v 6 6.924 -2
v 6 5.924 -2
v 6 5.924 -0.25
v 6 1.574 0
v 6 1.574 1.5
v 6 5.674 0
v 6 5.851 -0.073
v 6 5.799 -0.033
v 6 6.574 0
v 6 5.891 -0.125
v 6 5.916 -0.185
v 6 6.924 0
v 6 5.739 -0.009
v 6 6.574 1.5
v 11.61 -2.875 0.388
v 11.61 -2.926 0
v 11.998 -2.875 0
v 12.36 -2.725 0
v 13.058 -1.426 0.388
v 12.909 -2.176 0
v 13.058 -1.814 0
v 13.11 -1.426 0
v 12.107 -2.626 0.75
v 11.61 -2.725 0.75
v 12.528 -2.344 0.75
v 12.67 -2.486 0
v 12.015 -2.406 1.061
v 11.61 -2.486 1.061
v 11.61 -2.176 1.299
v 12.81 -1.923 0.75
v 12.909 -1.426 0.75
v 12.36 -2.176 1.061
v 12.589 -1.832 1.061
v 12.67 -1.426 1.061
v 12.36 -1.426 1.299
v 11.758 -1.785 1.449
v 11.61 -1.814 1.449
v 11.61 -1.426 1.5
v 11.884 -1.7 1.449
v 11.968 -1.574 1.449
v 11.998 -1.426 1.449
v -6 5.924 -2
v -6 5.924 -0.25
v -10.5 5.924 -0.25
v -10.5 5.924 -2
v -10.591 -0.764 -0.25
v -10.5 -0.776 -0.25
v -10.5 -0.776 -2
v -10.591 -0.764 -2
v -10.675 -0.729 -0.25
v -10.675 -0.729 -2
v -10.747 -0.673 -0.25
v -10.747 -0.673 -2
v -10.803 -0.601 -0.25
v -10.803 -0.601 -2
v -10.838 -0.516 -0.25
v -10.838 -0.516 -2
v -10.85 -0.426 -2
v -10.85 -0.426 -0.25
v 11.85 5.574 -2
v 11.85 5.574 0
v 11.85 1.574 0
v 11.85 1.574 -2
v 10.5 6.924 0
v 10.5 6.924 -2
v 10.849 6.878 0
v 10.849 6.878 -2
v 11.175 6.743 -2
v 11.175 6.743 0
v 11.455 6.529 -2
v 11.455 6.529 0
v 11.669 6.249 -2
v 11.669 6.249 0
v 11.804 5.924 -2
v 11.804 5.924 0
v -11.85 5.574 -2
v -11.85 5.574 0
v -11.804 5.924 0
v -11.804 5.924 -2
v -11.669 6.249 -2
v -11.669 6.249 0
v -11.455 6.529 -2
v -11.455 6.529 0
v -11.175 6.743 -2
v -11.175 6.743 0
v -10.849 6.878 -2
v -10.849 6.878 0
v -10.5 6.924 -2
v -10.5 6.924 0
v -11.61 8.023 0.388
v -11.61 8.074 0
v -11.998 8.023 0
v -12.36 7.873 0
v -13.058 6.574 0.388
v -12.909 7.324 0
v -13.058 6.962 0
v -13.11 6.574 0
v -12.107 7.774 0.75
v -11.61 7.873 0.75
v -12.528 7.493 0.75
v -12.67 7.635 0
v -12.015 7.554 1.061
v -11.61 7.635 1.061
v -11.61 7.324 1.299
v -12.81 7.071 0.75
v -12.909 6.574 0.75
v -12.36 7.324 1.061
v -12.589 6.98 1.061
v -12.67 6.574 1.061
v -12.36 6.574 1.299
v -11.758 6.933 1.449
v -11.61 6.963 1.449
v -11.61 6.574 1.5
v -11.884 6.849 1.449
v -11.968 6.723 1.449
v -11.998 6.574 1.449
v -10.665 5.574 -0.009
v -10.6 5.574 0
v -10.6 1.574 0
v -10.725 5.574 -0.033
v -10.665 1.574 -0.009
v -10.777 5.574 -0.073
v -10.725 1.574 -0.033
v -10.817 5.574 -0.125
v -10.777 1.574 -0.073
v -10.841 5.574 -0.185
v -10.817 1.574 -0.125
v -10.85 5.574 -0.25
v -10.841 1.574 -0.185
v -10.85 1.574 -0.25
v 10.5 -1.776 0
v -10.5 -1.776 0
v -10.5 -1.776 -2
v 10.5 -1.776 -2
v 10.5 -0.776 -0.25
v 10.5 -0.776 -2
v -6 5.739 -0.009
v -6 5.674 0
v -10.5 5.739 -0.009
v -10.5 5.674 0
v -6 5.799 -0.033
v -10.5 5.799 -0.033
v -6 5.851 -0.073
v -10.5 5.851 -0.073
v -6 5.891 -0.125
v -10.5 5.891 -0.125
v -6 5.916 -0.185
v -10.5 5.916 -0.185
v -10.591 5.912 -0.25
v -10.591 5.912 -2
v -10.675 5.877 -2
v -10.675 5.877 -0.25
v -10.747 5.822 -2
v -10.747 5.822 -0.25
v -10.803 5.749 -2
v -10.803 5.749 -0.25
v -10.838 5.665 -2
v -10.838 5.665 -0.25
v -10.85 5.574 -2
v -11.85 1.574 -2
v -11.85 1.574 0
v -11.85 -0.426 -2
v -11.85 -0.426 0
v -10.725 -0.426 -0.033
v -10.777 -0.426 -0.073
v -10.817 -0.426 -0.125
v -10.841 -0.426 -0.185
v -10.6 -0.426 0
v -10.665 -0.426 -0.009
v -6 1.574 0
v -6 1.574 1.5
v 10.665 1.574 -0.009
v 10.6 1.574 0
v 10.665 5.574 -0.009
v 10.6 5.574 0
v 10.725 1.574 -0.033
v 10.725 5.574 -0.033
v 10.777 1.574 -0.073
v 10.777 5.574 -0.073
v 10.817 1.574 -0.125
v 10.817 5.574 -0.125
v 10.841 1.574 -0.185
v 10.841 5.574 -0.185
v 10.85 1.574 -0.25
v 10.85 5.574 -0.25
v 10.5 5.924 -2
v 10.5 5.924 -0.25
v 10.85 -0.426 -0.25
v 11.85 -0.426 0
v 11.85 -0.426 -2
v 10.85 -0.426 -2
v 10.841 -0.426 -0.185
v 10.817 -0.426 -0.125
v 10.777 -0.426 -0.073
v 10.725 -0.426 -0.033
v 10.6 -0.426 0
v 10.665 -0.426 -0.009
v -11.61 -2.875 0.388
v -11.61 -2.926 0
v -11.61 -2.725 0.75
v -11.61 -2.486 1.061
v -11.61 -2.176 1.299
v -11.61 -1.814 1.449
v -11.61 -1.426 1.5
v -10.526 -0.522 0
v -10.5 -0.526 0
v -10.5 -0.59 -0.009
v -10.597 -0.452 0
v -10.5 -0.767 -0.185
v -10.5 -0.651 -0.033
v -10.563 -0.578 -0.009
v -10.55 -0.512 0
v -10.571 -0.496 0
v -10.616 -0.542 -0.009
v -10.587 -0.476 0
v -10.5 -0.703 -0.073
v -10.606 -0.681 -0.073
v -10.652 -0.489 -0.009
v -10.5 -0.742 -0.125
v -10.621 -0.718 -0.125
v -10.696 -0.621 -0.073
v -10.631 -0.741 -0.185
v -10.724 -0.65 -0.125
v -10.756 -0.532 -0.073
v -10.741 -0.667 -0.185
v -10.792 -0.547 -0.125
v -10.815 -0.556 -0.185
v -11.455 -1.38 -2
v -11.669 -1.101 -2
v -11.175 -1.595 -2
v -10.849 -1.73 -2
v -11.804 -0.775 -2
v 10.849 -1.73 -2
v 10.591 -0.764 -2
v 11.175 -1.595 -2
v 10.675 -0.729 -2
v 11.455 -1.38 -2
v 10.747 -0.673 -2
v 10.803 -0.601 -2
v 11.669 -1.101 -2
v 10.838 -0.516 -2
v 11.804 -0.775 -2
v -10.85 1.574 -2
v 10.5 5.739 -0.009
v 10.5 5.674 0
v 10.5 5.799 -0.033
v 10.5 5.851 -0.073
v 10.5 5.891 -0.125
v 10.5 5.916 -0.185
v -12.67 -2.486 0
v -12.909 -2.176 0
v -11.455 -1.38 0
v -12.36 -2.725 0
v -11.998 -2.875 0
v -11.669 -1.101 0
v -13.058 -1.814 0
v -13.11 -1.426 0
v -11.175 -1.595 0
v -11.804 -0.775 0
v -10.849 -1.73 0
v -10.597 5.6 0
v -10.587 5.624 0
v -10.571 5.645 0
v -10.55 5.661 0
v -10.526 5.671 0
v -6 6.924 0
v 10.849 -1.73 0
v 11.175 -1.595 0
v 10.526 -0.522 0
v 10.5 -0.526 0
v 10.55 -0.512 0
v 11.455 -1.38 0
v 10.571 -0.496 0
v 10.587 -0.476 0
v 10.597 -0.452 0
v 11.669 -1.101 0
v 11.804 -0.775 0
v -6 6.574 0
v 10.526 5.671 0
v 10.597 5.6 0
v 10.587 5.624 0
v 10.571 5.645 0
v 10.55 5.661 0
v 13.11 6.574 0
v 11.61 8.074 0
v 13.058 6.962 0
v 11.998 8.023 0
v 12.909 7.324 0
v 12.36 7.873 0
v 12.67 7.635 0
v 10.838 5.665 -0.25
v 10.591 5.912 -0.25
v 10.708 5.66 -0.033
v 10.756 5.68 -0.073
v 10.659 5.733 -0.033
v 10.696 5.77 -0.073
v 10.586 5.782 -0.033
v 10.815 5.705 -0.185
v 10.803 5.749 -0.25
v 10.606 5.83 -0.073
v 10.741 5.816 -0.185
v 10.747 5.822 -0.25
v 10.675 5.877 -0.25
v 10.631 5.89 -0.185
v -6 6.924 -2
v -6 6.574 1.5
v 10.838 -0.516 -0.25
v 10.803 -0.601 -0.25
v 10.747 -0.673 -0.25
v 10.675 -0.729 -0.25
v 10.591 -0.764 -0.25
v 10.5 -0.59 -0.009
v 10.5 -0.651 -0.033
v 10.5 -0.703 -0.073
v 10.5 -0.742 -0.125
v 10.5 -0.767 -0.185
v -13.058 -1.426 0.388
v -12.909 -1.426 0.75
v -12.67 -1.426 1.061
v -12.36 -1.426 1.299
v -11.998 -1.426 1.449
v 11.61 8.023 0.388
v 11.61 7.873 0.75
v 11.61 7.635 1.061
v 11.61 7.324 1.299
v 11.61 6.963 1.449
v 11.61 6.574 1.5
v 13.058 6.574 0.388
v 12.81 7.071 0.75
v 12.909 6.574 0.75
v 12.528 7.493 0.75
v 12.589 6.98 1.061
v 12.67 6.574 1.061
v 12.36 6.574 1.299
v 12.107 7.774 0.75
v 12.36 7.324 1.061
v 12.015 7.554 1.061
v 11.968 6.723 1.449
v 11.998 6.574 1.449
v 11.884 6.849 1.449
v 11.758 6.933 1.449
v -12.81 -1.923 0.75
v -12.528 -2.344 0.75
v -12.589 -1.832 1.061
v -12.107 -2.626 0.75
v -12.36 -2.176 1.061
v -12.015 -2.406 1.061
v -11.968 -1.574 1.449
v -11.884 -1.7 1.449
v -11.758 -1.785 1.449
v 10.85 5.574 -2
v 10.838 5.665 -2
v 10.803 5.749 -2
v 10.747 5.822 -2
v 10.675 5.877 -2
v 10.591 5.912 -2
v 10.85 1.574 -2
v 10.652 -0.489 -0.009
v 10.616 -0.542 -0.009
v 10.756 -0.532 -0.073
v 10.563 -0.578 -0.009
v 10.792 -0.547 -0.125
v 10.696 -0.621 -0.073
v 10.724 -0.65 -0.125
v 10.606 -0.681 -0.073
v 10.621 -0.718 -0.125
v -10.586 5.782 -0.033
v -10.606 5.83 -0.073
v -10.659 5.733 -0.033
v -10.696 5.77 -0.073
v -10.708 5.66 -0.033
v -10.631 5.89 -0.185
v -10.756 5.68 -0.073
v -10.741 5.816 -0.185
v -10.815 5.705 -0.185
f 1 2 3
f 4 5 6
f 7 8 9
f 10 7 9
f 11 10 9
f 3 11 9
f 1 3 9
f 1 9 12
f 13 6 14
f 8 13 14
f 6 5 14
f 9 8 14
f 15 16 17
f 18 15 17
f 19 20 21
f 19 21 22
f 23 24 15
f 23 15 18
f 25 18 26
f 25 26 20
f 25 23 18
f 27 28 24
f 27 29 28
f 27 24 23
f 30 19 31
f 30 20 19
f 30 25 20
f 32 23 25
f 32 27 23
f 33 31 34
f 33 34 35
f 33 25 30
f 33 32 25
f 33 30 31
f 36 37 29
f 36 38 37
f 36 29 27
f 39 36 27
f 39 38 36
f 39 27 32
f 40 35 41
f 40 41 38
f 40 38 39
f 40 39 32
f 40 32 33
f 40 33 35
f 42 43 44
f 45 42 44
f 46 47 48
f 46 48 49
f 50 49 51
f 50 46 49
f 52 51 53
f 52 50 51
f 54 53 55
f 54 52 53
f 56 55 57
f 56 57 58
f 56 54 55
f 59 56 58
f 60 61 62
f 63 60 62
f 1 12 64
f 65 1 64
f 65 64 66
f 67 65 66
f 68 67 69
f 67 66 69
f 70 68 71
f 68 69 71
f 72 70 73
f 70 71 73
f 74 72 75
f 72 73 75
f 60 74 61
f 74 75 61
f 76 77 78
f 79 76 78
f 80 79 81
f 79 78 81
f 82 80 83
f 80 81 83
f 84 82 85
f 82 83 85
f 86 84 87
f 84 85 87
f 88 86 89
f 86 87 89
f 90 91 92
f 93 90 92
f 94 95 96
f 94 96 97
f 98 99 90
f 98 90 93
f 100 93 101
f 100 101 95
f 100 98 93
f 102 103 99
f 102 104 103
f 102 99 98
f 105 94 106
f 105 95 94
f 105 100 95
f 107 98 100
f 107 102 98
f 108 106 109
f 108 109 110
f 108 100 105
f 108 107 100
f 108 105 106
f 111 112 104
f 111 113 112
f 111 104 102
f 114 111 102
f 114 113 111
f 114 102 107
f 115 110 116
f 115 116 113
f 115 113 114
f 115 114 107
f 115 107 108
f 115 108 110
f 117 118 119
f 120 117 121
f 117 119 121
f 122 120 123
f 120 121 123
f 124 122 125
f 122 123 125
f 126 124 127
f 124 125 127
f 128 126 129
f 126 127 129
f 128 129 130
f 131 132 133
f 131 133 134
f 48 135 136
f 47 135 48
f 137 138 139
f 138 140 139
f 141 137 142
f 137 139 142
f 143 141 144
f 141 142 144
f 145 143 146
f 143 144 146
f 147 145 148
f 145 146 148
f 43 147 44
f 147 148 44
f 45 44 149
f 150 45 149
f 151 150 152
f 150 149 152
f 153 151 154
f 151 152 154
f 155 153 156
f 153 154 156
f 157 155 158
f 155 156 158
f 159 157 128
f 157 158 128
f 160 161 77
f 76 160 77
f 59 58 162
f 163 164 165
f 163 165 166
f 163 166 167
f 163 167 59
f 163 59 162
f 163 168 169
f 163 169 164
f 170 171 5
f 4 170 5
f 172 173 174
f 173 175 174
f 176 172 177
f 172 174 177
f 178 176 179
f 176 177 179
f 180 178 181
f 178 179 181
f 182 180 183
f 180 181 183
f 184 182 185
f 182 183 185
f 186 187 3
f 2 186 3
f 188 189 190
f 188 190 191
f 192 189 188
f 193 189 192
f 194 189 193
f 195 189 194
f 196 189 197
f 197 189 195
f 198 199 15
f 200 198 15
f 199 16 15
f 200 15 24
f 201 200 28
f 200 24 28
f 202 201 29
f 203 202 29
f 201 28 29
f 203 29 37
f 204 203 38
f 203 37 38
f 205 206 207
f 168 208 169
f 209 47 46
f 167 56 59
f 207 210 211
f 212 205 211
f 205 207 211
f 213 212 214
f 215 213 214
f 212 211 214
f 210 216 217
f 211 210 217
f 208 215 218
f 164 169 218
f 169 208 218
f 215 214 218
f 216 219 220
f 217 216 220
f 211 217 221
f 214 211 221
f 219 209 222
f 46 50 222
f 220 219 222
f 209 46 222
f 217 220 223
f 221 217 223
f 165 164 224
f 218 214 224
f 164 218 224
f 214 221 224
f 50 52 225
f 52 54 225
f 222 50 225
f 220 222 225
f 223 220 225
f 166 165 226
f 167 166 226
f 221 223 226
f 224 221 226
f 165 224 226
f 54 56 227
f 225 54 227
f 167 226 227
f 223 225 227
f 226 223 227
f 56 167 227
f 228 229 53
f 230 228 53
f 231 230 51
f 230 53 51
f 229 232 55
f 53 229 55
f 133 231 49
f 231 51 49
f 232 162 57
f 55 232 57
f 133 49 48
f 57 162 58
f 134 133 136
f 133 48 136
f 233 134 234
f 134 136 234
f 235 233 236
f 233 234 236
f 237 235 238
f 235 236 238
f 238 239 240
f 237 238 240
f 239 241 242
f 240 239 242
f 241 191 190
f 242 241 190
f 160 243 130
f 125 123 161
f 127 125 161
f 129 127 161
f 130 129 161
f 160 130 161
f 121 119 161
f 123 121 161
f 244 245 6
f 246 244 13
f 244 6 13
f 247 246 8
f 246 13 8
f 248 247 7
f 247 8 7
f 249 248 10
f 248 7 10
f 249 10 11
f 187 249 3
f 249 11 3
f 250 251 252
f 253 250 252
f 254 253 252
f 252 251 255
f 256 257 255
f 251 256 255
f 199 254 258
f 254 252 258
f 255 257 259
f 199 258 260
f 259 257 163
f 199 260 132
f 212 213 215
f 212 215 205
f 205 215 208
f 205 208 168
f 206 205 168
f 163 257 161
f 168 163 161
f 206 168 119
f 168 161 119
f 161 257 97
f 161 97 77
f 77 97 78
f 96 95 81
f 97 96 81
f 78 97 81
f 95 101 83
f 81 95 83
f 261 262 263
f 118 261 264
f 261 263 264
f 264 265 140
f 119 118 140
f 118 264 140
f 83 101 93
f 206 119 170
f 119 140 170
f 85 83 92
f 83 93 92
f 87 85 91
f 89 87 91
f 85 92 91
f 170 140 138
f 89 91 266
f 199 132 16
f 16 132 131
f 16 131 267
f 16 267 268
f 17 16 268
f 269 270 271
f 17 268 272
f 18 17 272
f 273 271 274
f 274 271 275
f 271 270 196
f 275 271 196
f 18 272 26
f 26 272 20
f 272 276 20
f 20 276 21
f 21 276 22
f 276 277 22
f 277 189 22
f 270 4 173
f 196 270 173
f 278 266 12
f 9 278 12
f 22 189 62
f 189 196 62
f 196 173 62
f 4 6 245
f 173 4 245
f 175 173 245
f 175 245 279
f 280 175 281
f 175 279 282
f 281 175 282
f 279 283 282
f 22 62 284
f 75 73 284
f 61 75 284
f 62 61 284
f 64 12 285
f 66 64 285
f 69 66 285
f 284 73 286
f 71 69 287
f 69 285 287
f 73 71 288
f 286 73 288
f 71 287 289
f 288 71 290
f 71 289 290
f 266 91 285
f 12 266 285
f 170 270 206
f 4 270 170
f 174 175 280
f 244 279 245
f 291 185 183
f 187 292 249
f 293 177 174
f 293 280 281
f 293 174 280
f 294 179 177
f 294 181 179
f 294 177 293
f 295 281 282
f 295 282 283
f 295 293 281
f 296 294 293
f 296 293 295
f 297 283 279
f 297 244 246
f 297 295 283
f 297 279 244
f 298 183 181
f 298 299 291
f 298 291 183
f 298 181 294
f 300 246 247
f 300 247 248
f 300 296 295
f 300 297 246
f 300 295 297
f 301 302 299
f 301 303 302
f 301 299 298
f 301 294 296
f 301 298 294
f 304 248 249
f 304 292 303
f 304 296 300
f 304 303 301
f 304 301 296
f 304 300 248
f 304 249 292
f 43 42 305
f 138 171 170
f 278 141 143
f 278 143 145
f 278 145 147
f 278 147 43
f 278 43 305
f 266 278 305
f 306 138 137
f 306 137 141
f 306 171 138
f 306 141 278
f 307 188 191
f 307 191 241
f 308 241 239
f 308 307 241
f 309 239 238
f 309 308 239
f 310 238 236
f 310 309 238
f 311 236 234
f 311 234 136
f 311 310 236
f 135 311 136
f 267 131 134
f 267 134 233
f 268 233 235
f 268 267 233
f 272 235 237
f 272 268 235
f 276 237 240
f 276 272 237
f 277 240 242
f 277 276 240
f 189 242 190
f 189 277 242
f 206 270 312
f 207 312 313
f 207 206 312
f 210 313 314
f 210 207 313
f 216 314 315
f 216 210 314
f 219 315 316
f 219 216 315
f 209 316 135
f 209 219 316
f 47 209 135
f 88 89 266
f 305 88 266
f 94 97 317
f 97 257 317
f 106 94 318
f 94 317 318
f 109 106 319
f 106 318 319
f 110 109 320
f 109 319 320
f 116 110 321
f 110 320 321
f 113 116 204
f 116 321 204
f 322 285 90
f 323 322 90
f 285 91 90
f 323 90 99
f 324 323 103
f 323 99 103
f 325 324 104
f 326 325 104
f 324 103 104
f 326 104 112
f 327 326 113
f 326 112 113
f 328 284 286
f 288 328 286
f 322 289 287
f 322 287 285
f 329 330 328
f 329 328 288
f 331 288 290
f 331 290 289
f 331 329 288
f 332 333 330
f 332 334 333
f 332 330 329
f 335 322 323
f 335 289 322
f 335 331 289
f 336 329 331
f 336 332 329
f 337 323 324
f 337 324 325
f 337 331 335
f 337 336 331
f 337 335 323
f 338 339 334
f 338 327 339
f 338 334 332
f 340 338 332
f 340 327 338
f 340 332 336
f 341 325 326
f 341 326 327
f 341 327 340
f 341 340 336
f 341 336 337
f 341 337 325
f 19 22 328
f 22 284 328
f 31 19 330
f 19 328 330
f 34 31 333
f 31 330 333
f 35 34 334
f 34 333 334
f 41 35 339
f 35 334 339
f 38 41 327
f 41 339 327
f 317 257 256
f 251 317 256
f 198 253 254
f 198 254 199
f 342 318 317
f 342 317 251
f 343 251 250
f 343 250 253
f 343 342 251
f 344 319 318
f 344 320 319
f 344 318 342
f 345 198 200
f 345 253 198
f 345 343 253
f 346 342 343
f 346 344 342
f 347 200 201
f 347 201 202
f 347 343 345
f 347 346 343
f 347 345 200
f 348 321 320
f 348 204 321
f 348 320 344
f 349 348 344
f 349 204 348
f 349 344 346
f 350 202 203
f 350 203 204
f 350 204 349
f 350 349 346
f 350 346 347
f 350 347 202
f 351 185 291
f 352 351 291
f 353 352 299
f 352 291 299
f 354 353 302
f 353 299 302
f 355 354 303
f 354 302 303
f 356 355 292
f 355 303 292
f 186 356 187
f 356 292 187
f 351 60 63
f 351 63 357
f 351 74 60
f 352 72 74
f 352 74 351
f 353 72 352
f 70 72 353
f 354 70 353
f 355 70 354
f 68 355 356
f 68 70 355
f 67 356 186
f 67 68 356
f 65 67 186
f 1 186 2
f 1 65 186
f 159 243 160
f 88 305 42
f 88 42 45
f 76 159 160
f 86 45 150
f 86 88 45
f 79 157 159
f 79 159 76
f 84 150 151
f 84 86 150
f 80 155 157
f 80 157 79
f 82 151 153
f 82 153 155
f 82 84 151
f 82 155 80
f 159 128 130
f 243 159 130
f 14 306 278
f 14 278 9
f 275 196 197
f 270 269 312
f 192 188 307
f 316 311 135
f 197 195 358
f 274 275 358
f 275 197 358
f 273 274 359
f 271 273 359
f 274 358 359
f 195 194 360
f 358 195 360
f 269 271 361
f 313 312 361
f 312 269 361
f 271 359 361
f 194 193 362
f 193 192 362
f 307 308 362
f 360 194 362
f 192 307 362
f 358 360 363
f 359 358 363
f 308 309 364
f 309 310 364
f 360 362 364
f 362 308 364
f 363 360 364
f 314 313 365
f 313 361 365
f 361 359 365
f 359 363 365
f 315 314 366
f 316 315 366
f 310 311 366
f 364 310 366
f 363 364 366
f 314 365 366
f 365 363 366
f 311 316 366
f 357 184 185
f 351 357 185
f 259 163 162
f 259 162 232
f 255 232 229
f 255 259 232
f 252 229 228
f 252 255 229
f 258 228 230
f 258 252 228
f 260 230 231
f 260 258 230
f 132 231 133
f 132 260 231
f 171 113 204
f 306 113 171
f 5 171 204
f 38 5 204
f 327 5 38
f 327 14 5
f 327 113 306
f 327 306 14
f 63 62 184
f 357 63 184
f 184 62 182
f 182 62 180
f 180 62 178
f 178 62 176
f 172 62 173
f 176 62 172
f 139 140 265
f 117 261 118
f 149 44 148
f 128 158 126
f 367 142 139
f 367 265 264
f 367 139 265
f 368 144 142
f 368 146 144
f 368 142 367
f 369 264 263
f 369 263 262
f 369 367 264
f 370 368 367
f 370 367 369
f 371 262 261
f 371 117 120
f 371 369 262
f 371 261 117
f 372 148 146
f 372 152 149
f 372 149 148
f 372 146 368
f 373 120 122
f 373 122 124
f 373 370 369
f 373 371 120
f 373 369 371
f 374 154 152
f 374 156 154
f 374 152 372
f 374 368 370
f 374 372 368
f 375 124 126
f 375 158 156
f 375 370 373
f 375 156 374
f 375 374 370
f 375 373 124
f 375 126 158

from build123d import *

# Parameters (mm, degrees)
BOSS_EXTRUDE1_DEPTH   = 2
BOSS_EXTRUDE1_2_DEPTH = 2
BOSS_EXTRUDE2_DEPTH   = 1.5
FILLET1_R             = 1.5
SKETCH4_W             = 12
SKETCH4_H             = 5
CUT_EXTRUDE1_DEPTH    = 1.5
SKETCH5_W             = 12
SKETCH5_H             = 1
CUT_EXTRUDE2_DEPTH    = 2
FILLET2_R             = 0.25


with BuildPart() as part:
    # Sketch2 → Boss-Extrude1 (new body)
    with BuildSketch(Plane.XY):
        with BuildLine():
            Line((11.85, -0.425762181), (10.85, -0.425762181))
            ThreePointArc((10.85, -0.425762181), (10.747487373, -0.673249555), (10.5, -0.775762181))
            Line((10.5, -0.775762181), (-10.5, -0.775762181))
            ThreePointArc((-10.5, -0.775762181), (-10.747487373, -0.673249555), (-10.85, -0.425762181))
            Line((-10.85, -0.425762181), (-11.85, -0.425762181))
            ThreePointArc((-11.85, -0.425762181), (-11.454594155, -1.380356336), (-10.5, -1.775762181))
            Line((-10.5, -1.775762181), (10.5, -1.775762181))
            ThreePointArc((10.5, -1.775762181), (11.454594155, -1.380356336), (11.85, -0.425762181))
        make_face()
    extrude(amount=-BOSS_EXTRUDE1_DEPTH)



with BuildPart() as body_2:
    # Sketch2 → Boss-Extrude1 2 (new body)
    with BuildSketch(Plane.XY):
        with BuildLine():
            Line((11.85, 1.574237819), (10.85, 1.574237819))
            Line((10.85, 1.574237819), (10.85, 5.574237819))
            ThreePointArc((10.85, 5.574237819), (10.747487373, 5.821725192), (10.5, 5.924237819))
            Line((10.5, 5.924237819), (-10.5, 5.924237819))
            ThreePointArc((-10.5, 5.924237819), (-10.747487373, 5.821725192), (-10.85, 5.574237819))
            Line((-10.85, 5.574237819), (-10.85, 1.574237819))
            Line((-10.85, 1.574237819), (-11.85, 1.574237819))
            Line((-11.85, 1.574237819), (-11.85, 5.574237819))
            ThreePointArc((-11.85, 5.574237819), (-11.454594155, 6.528831973), (-10.5, 6.924237819))
            Line((-10.5, 6.924237819), (10.5, 6.924237819))
            ThreePointArc((10.5, 6.924237819), (11.454594155, 6.528831973), (11.85, 5.574237819))
            Line((11.85, 5.574237819), (11.85, 1.574237819))
        make_face()
    extrude(amount=-BOSS_EXTRUDE1_2_DEPTH)


with BuildPart() as part_1:
    add(part.part)

    add(body_2.part)  # Boss-Extrude2 merges body 2
    # Sketch3 → Boss-Extrude2 (add)
    with BuildSketch(Plane.XY):
        with BuildLine():
            Line((11.6095027, 8.074237819), (-11.6095027, 8.074237819))
            ThreePointArc((-11.6095027, 8.074237819), (-12.670162872, 7.63489799), (-13.1095027, 6.574237819))
            Line((-13.1095027, 6.574237819), (-13.1095027, -1.425762181))
            ThreePointArc((-13.1095027, -1.425762181), (-12.670162872, -2.486422353), (-11.6095027, -2.925762181))
            Line((-11.6095027, -2.925762181), (11.6095027, -2.925762181))
            ThreePointArc((11.6095027, -2.925762181), (12.670162872, -2.486422353), (13.1095027, -1.425762181))
            Line((13.1095027, -1.425762181), (13.1095027, 6.574237819))
            ThreePointArc((13.1095027, 6.574237819), (12.670162872, 7.63489799), (11.6095027, 8.074237819))
        make_face()
    extrude(amount=BOSS_EXTRUDE2_DEPTH)

    # Fillet1
    fillet1_edges = [part_1.edges().sort_by_distance(p)[0] for p in [
        (12.670162872, 7.63489799, 1.5),
        (13.1095027, 2.574237819, 1.5),
        (12.670162872, -2.486422353, 1.5),
        (0, -2.925762181, 1.5),
        (-12.670162872, -2.486422353, 1.5),
        (-13.1095027, 2.574237819, 1.5),
        (-12.670162872, 7.63489799, 1.5),
        (0, 8.074237819, 1.5),
    ]]
    fillet(fillet1_edges, radius=FILLET1_R - 0.0001)  # a hair under: the kernel refuses the full size

    # Sketch4 → Cut-Extrude1 (cut)
    with BuildSketch(Plane.XY.offset(1.5)):
        with Locations((0, 4.074237819)):
            Rectangle(SKETCH4_W, SKETCH4_H)
    extrude(amount=-CUT_EXTRUDE1_DEPTH, mode=Mode.SUBTRACT)

    # Sketch5 → Cut-Extrude2 (cut)
    with BuildSketch(Plane(origin=(0, 0, -2), x_dir=(-1, 0, 0), z_dir=(0, 0, -1))):
        with Locations((0, 6.424237819)):
            Rectangle(SKETCH5_W, SKETCH5_H)
    extrude(amount=-CUT_EXTRUDE2_DEPTH, mode=Mode.SUBTRACT)

    # Fillet2
    fillet2_edges = [part_1.edges().sort_by_distance(p)[0] for p in [
        (0, -0.775762181, 0),
        (10.747487373, -0.673249555, 0),
        (10.747487373, 5.821725192, 0),
        (10.85, 3.574237819, 0),
        (-10.85, 3.574237819, 0),
        (-10.747487373, 5.821725192, 0),
        (-8.25, 5.924237819, 0),
        (8.25, 5.924237819, 0),
        (-10.747487373, -0.673249555, 0),
    ]]
    fillet(fillet2_edges, radius=FILLET2_R)


solid = part_1.part
